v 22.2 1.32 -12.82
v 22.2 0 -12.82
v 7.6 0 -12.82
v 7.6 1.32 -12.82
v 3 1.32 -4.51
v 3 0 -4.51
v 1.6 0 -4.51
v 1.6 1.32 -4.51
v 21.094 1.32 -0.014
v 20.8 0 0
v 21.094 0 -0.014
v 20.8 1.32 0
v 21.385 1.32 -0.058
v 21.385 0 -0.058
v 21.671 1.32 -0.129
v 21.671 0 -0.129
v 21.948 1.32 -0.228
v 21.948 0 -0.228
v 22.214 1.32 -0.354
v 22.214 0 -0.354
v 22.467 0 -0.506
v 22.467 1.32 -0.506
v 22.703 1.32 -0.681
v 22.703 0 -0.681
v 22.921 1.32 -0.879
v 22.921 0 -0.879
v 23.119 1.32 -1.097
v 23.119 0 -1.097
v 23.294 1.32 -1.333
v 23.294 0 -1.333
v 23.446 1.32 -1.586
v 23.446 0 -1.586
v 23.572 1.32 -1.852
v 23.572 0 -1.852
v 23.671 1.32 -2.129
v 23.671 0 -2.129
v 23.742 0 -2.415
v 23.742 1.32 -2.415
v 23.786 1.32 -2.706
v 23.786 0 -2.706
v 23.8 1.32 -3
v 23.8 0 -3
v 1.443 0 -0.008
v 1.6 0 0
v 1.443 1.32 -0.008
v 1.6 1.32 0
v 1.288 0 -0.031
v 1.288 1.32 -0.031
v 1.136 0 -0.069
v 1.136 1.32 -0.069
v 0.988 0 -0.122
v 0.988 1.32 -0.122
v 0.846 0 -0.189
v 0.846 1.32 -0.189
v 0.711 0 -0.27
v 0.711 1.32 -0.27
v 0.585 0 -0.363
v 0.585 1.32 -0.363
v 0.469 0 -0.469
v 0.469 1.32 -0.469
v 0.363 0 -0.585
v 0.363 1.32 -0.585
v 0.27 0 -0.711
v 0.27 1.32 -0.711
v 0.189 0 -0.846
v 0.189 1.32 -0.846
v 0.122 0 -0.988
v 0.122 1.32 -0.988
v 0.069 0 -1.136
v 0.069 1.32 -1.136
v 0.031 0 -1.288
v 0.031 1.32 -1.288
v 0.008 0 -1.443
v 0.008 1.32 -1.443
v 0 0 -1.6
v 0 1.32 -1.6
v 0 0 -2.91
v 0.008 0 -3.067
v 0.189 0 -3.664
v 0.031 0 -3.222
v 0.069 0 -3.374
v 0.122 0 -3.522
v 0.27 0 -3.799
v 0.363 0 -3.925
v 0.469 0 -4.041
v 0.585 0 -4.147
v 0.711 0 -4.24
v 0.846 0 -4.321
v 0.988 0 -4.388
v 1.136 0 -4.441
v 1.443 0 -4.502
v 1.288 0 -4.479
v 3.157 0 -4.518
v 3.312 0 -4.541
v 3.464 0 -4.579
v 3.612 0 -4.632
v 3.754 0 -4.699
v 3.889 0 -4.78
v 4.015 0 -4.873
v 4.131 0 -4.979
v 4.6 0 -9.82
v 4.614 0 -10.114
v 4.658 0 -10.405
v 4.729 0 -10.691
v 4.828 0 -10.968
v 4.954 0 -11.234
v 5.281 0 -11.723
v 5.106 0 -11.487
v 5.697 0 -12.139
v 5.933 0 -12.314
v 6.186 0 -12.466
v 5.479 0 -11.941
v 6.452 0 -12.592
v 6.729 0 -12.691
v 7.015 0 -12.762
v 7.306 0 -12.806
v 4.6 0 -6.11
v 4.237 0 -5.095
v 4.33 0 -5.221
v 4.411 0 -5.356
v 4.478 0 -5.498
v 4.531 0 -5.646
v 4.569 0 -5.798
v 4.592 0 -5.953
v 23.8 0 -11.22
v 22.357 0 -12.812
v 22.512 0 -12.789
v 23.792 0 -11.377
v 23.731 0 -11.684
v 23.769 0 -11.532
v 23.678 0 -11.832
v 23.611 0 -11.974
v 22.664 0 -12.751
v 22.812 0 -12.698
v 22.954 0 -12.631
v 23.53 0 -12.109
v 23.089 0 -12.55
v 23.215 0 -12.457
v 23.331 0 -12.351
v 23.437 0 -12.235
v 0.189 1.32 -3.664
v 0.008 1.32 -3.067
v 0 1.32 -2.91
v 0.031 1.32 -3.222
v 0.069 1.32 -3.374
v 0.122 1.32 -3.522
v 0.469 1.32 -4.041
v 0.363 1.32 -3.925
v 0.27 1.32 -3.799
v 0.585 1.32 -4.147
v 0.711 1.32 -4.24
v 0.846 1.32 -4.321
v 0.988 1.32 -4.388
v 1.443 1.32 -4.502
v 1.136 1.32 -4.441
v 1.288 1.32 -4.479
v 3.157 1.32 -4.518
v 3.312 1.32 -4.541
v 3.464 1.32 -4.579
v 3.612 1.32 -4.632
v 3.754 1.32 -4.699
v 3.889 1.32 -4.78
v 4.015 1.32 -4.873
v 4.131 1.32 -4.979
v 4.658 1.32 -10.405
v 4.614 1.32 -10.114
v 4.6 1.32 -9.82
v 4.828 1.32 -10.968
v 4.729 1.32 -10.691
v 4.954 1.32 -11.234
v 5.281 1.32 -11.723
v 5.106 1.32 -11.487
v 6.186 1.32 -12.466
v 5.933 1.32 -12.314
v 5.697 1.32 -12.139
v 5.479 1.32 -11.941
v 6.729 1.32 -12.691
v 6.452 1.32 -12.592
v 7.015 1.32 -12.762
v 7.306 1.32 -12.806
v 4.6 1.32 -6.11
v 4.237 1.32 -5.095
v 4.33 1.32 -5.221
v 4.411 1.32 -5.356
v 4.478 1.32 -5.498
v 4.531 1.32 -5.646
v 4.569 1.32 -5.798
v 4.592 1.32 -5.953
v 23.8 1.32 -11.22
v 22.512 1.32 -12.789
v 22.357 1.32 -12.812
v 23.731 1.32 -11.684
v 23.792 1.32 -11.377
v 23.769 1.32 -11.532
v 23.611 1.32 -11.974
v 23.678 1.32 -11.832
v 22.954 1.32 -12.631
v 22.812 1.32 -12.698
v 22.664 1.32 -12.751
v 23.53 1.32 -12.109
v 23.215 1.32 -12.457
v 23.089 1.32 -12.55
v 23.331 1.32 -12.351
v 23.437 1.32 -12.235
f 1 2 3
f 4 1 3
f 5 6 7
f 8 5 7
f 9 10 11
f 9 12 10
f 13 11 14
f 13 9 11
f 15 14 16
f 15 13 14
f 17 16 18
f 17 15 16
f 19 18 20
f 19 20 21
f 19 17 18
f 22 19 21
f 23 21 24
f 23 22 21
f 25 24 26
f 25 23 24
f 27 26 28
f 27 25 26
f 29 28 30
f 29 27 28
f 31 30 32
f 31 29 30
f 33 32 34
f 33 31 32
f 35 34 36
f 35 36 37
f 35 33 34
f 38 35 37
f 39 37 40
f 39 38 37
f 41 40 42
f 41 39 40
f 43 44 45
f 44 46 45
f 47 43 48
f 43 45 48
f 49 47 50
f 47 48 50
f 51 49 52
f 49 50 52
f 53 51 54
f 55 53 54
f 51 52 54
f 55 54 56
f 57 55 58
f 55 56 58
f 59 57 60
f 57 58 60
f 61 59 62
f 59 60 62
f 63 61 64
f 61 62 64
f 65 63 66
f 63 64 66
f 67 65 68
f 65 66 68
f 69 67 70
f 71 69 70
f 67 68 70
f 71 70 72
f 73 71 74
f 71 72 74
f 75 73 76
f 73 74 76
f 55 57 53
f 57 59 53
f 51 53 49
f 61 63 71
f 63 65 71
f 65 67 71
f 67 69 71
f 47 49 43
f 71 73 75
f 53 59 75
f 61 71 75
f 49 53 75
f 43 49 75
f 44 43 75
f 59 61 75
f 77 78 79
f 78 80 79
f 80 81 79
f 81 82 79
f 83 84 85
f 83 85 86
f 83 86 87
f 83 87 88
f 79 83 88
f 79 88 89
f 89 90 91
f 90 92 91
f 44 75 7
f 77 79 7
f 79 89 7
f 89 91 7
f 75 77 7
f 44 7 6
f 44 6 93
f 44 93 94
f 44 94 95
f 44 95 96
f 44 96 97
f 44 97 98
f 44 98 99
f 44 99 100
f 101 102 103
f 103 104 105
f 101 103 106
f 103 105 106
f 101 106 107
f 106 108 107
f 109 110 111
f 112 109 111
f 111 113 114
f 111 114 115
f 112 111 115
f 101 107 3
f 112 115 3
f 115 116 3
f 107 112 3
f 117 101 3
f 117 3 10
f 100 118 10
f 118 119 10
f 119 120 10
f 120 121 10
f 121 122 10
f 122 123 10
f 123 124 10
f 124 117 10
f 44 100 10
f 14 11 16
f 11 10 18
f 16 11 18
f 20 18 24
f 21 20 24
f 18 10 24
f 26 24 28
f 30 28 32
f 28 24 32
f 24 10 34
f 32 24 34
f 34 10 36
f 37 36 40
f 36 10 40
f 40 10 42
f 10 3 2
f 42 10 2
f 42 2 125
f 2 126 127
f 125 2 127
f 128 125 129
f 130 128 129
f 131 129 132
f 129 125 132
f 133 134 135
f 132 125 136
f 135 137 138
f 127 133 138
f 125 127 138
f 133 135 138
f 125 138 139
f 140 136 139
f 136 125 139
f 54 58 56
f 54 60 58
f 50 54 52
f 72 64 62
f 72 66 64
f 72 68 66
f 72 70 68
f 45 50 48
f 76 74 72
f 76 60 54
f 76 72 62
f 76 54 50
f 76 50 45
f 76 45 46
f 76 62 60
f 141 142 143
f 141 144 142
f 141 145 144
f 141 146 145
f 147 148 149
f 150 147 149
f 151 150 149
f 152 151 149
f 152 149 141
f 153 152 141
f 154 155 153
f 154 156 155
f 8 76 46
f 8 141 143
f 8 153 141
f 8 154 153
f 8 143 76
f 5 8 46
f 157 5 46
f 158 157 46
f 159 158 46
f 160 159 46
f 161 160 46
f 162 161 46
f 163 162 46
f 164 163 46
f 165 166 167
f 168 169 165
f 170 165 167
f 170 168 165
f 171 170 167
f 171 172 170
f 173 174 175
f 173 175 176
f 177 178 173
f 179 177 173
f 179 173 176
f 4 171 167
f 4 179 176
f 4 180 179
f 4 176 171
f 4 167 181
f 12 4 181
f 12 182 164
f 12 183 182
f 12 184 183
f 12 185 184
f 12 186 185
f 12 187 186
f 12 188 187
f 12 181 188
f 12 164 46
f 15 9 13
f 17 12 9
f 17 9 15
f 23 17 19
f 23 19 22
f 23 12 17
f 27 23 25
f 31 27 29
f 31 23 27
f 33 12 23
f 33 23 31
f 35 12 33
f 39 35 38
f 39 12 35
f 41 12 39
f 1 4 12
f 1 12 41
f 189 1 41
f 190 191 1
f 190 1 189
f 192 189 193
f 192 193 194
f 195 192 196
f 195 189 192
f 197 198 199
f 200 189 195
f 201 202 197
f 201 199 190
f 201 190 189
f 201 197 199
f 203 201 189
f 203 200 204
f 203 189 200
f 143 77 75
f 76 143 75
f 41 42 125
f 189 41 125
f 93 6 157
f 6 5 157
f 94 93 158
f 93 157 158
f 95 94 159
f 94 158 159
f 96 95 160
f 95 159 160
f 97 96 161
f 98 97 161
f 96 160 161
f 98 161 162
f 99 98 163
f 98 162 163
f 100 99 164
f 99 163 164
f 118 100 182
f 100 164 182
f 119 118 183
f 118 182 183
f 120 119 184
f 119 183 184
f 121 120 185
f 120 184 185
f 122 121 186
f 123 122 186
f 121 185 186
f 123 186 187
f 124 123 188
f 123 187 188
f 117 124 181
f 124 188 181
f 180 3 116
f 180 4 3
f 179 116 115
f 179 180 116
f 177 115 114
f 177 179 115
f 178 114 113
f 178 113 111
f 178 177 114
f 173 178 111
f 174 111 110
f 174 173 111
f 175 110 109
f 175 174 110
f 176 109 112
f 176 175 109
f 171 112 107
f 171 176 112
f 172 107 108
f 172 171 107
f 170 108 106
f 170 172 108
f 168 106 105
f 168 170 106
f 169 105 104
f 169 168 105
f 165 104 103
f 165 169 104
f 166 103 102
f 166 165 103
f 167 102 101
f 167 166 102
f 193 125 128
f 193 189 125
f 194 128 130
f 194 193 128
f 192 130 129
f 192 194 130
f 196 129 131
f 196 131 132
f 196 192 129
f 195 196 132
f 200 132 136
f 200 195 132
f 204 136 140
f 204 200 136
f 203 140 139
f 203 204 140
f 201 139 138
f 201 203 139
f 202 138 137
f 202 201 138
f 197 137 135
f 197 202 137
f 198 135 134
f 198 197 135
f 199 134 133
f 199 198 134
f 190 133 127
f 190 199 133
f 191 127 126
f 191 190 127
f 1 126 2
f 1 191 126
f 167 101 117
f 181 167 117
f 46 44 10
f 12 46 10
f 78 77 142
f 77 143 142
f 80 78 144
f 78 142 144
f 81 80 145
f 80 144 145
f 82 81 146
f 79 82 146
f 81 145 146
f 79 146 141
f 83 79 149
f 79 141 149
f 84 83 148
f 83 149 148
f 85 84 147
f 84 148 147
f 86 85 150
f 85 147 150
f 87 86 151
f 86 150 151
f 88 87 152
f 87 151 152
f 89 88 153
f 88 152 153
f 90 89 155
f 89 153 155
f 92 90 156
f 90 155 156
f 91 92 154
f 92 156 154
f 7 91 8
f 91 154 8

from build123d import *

# Parameters (mm, degrees)
BOSS_EXTRUDE1_DEPTH = 1.32
FILLET1_R           = 3
FILLET2_R           = 1.6


with BuildPart() as part:
    # Sketch1 → Boss-Extrude1 (new body)
    with BuildSketch(Plane(origin=(0, 0, 0), x_dir=(1, 0, 0), z_dir=(0, 1, 0))):
        Polygon((0, 4.51), (0, 0), (23.8, 0), (23.8, 12.82), (4.6, 12.82), (4.6, 4.51), align=None)
    extrude(amount=BOSS_EXTRUDE1_DEPTH)

    # Fillet1
    fillet1_edges = [part.edges().sort_by_distance(p)[0] for p in [
        (4.6, 0.66, -12.82),
        (23.8, 0.66, 0),
    ]]
    fillet(fillet1_edges, radius=FILLET1_R)

    # Fillet2
    fillet2_edges = [part.edges().sort_by_distance(p)[0] for p in [
        (0, 0.66, -4.51),
        (4.6, 0.66, -4.51),
        (23.8, 0.66, -12.82),
        (0, 0.66, 0),
    ]]
    fillet(fillet2_edges, radius=FILLET2_R)


solid = part.part
